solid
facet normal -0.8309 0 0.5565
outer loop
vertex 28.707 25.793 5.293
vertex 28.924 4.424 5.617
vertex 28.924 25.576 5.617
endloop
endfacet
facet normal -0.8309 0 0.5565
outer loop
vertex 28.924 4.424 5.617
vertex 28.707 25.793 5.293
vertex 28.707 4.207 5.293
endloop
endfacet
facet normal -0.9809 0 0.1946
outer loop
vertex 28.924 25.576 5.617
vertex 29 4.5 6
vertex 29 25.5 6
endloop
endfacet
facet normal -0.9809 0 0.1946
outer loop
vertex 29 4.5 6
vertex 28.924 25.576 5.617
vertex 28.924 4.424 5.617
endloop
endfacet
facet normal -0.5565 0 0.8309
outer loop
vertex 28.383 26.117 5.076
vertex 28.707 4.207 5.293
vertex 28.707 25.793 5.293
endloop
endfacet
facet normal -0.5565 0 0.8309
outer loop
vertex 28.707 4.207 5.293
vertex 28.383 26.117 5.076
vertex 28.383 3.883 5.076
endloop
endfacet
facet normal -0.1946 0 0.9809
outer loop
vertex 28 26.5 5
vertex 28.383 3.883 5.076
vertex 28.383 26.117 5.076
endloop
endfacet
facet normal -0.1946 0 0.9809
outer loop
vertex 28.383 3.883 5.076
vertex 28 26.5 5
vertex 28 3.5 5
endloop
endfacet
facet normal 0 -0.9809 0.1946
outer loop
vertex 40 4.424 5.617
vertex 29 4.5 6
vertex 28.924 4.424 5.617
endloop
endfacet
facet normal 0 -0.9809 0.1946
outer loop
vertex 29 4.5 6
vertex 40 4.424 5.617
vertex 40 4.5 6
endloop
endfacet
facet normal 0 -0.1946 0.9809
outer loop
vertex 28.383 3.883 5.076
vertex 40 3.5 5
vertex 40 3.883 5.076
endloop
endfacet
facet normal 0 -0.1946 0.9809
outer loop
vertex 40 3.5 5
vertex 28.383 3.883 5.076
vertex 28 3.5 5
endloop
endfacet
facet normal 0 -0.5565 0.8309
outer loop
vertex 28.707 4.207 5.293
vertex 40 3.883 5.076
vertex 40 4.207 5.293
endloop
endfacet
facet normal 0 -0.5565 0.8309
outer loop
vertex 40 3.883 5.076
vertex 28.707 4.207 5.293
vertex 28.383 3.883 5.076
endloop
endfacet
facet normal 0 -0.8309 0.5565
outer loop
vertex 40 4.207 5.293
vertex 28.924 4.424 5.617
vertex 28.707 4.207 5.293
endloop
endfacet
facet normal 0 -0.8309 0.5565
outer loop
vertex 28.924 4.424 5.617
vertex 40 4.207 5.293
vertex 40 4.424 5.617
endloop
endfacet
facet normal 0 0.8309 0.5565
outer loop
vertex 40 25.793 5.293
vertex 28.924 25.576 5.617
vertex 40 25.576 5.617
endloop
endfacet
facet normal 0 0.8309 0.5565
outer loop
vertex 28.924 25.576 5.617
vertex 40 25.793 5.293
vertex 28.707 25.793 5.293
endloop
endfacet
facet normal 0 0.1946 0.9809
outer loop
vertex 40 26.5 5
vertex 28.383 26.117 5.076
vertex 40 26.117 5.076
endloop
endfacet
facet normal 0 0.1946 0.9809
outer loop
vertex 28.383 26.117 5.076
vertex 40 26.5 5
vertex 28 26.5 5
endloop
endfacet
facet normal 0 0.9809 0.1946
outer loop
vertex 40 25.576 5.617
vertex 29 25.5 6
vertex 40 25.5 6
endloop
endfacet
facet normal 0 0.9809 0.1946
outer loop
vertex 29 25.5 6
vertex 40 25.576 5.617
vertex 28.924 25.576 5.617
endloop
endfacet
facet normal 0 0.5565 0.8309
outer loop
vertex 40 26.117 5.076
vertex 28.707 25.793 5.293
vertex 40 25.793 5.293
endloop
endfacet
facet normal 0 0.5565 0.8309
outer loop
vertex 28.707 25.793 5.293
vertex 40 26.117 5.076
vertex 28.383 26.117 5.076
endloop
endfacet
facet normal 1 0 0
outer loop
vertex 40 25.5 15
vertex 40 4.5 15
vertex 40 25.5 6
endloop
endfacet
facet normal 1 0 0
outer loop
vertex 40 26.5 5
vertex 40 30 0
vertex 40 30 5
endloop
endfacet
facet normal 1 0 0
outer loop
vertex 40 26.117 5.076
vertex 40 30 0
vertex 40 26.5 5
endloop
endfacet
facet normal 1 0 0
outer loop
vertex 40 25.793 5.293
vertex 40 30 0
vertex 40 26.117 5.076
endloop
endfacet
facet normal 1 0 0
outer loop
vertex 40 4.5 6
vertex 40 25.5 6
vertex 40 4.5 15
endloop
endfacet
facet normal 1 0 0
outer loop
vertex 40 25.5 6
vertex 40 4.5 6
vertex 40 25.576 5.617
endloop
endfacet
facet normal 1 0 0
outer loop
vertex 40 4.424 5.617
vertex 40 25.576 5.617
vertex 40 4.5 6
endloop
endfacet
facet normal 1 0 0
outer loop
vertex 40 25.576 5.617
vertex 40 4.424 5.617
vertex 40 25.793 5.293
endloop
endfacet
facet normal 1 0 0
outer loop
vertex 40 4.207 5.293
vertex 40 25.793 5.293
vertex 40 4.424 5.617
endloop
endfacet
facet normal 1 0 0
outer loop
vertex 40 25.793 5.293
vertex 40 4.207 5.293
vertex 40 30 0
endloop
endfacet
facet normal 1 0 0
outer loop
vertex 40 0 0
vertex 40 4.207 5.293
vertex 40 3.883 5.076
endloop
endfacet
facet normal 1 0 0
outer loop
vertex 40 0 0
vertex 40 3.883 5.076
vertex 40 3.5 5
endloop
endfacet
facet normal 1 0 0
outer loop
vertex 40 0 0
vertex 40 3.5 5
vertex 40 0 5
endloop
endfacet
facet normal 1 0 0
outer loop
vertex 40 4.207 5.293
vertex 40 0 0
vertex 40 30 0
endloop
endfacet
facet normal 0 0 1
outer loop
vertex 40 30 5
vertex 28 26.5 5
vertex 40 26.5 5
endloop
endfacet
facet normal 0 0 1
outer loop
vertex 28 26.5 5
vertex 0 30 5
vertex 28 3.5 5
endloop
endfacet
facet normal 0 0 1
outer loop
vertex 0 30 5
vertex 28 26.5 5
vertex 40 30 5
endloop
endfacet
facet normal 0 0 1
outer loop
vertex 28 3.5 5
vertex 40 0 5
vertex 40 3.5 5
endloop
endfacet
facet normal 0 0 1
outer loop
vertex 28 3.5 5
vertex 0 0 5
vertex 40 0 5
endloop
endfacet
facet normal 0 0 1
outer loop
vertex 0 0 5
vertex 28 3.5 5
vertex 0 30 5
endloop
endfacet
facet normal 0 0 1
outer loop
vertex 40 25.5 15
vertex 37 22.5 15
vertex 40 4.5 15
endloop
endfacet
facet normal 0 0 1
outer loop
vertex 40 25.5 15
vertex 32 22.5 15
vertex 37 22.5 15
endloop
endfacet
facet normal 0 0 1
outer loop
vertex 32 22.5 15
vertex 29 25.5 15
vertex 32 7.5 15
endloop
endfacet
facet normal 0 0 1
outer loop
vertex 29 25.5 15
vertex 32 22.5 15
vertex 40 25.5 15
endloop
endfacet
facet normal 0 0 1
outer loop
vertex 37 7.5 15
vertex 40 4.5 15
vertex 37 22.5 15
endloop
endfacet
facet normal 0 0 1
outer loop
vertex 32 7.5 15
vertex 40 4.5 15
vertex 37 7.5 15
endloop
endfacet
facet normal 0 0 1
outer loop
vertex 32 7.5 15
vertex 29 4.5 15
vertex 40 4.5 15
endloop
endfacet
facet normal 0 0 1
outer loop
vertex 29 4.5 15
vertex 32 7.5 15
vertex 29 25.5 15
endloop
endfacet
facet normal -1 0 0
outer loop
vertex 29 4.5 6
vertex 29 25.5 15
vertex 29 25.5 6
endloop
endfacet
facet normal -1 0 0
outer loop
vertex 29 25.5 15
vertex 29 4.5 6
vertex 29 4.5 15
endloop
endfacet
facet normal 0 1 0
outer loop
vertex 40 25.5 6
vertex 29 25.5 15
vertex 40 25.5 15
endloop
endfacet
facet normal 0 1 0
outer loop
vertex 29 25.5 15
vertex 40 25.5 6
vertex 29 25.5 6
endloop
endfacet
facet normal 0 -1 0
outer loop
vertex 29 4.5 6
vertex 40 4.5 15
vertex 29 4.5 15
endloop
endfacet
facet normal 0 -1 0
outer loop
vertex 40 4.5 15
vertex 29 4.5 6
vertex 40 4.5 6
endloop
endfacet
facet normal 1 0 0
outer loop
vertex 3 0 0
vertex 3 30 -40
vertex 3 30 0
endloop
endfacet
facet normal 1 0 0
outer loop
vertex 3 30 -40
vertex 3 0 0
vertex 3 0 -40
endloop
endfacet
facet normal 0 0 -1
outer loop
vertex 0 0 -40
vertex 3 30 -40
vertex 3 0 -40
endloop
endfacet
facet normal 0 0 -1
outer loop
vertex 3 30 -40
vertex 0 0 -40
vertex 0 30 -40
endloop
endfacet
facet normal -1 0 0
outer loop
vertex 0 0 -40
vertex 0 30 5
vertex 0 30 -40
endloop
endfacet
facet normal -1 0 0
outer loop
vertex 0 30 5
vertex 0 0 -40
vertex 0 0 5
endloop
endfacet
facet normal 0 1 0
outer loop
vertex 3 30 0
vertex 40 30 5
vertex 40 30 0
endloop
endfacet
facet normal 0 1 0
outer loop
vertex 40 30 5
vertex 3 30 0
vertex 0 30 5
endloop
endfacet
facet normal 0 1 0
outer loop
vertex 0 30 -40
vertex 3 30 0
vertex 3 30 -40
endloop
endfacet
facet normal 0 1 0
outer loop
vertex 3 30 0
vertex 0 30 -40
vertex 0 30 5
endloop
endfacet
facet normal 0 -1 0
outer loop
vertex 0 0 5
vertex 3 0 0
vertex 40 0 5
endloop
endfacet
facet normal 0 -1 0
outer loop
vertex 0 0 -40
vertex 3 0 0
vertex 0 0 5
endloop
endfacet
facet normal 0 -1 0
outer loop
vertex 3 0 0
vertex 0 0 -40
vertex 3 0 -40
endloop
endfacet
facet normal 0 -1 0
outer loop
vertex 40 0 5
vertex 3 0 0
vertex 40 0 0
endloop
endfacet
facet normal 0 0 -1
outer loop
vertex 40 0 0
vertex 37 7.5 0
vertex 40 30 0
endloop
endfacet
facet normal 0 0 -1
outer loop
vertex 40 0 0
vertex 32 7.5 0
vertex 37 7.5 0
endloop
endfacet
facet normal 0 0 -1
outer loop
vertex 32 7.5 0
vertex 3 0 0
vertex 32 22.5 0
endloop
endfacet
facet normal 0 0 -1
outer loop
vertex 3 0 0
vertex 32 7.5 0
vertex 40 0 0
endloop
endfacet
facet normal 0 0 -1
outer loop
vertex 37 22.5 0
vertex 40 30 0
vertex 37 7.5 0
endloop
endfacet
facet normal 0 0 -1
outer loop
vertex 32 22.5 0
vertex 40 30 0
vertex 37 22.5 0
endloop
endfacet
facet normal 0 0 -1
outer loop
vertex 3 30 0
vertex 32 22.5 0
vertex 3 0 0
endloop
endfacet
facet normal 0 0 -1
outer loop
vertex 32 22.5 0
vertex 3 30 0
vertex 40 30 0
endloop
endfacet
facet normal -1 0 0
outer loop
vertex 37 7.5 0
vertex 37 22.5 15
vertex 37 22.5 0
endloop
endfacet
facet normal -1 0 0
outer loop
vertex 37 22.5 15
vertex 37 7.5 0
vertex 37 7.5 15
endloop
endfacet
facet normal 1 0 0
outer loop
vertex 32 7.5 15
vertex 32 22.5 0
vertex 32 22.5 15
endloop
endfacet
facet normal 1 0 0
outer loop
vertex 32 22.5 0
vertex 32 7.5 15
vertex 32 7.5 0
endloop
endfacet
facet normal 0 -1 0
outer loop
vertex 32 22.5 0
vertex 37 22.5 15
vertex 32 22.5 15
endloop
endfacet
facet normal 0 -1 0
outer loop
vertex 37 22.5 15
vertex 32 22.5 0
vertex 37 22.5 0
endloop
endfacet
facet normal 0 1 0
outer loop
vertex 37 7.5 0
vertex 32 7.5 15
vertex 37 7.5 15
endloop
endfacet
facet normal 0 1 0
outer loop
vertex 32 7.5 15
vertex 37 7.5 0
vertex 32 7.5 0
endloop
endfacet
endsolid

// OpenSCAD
// file: common.scad
$fa = 1;
$fs = .4;

// Base, vertical part
base_h1 = 40;
base_w1 = 3;
base_d1 = 30;

// Base, horizontal part
base_h2 = 5;
base_w2 = 40;
base_d2 = base_d1;

// Base hole
hole_wall = 3;
hole_h = 10;
hole_fillet = 1;

// Stick
stick_h = 160;
stick_w = 5;
stick_d = 15;

// Head
head_h = 25;
head_hole_h = 10;

// Fit tolerances
press_fit = 0;
tight_fit = .13;
normal_fit = .250;
loose_fit = .5;

delta = .01;
// main file
// w, d, h

module fillet(position, sides = [true, true, true, true]) {
    difference() {
        // Fillet base
        cube([position[0], position[1], position[2]]);

        // Cylindrical shapes to remove from fillet base
        union() {
            if (sides[0])
                translate([0, -delta, position[2]])
                    rotate([-90, 0, 0])
                        cylinder(position[1] + 2 * delta, position[2], position[2]);

            if (sides[1])
                translate([position[0], -delta, position[2]])
                    rotate([-90, 0, 0])
                        cylinder(position[1] + 2 * delta, position[2], position[2]);

            if (sides[2])
                translate([-delta, 0, position[2]])
                    rotate([0, 90, 0])
                        cylinder(position[0] + 2 * delta, position[2], position[2]);

            if (sides[3])
                translate([-delta, position[1], position[2]])
                    rotate([0, 90, 0])
                        cylinder(position[0] + 2 * delta, position[2], position[2]);
        }
    }
}

module bevel(position, fillet_size) {
    difference() {
        union() {
            // Bevel body
            cube(position);

            // Bevel fillet
            fillet_position = [
                position[0] + fillet_size,
                position[1] + 2 * fillet_size,
                fillet_size
            ];

            translate([-fillet_size, -fillet_size, 0])
                fillet(fillet_position, [true, false, true, true]);
        }
    }
}

include <common.scad>;

// Base
difference() {
    // bevel position
    bevel_position = [
        base_w2 - (hole_wall + stick_w + hole_wall),
        (base_d2 - (hole_wall + stick_d + hole_wall)) / 2,
        base_h2
    ];

    union() {
        // Vertical part of base
        translate([0, 0, -base_h1])
            cube([base_w1, base_d1, base_h1 + delta]);

        // Horizontal part of base
        cube([base_w2, base_d2, base_h2]);

        // Bevel
        translate(bevel_position)
            bevel([
                hole_wall + stick_w + hole_wall,
                hole_wall + stick_d + hole_wall,
                hole_h
            ], hole_fillet);
    };

    // Bevel hole
    translate(bevel_position)
        translate([hole_wall, hole_wall, -(base_h2 + delta)])
            cube([stick_w, stick_d, base_h2 + hole_h + 2 * delta]);
};
